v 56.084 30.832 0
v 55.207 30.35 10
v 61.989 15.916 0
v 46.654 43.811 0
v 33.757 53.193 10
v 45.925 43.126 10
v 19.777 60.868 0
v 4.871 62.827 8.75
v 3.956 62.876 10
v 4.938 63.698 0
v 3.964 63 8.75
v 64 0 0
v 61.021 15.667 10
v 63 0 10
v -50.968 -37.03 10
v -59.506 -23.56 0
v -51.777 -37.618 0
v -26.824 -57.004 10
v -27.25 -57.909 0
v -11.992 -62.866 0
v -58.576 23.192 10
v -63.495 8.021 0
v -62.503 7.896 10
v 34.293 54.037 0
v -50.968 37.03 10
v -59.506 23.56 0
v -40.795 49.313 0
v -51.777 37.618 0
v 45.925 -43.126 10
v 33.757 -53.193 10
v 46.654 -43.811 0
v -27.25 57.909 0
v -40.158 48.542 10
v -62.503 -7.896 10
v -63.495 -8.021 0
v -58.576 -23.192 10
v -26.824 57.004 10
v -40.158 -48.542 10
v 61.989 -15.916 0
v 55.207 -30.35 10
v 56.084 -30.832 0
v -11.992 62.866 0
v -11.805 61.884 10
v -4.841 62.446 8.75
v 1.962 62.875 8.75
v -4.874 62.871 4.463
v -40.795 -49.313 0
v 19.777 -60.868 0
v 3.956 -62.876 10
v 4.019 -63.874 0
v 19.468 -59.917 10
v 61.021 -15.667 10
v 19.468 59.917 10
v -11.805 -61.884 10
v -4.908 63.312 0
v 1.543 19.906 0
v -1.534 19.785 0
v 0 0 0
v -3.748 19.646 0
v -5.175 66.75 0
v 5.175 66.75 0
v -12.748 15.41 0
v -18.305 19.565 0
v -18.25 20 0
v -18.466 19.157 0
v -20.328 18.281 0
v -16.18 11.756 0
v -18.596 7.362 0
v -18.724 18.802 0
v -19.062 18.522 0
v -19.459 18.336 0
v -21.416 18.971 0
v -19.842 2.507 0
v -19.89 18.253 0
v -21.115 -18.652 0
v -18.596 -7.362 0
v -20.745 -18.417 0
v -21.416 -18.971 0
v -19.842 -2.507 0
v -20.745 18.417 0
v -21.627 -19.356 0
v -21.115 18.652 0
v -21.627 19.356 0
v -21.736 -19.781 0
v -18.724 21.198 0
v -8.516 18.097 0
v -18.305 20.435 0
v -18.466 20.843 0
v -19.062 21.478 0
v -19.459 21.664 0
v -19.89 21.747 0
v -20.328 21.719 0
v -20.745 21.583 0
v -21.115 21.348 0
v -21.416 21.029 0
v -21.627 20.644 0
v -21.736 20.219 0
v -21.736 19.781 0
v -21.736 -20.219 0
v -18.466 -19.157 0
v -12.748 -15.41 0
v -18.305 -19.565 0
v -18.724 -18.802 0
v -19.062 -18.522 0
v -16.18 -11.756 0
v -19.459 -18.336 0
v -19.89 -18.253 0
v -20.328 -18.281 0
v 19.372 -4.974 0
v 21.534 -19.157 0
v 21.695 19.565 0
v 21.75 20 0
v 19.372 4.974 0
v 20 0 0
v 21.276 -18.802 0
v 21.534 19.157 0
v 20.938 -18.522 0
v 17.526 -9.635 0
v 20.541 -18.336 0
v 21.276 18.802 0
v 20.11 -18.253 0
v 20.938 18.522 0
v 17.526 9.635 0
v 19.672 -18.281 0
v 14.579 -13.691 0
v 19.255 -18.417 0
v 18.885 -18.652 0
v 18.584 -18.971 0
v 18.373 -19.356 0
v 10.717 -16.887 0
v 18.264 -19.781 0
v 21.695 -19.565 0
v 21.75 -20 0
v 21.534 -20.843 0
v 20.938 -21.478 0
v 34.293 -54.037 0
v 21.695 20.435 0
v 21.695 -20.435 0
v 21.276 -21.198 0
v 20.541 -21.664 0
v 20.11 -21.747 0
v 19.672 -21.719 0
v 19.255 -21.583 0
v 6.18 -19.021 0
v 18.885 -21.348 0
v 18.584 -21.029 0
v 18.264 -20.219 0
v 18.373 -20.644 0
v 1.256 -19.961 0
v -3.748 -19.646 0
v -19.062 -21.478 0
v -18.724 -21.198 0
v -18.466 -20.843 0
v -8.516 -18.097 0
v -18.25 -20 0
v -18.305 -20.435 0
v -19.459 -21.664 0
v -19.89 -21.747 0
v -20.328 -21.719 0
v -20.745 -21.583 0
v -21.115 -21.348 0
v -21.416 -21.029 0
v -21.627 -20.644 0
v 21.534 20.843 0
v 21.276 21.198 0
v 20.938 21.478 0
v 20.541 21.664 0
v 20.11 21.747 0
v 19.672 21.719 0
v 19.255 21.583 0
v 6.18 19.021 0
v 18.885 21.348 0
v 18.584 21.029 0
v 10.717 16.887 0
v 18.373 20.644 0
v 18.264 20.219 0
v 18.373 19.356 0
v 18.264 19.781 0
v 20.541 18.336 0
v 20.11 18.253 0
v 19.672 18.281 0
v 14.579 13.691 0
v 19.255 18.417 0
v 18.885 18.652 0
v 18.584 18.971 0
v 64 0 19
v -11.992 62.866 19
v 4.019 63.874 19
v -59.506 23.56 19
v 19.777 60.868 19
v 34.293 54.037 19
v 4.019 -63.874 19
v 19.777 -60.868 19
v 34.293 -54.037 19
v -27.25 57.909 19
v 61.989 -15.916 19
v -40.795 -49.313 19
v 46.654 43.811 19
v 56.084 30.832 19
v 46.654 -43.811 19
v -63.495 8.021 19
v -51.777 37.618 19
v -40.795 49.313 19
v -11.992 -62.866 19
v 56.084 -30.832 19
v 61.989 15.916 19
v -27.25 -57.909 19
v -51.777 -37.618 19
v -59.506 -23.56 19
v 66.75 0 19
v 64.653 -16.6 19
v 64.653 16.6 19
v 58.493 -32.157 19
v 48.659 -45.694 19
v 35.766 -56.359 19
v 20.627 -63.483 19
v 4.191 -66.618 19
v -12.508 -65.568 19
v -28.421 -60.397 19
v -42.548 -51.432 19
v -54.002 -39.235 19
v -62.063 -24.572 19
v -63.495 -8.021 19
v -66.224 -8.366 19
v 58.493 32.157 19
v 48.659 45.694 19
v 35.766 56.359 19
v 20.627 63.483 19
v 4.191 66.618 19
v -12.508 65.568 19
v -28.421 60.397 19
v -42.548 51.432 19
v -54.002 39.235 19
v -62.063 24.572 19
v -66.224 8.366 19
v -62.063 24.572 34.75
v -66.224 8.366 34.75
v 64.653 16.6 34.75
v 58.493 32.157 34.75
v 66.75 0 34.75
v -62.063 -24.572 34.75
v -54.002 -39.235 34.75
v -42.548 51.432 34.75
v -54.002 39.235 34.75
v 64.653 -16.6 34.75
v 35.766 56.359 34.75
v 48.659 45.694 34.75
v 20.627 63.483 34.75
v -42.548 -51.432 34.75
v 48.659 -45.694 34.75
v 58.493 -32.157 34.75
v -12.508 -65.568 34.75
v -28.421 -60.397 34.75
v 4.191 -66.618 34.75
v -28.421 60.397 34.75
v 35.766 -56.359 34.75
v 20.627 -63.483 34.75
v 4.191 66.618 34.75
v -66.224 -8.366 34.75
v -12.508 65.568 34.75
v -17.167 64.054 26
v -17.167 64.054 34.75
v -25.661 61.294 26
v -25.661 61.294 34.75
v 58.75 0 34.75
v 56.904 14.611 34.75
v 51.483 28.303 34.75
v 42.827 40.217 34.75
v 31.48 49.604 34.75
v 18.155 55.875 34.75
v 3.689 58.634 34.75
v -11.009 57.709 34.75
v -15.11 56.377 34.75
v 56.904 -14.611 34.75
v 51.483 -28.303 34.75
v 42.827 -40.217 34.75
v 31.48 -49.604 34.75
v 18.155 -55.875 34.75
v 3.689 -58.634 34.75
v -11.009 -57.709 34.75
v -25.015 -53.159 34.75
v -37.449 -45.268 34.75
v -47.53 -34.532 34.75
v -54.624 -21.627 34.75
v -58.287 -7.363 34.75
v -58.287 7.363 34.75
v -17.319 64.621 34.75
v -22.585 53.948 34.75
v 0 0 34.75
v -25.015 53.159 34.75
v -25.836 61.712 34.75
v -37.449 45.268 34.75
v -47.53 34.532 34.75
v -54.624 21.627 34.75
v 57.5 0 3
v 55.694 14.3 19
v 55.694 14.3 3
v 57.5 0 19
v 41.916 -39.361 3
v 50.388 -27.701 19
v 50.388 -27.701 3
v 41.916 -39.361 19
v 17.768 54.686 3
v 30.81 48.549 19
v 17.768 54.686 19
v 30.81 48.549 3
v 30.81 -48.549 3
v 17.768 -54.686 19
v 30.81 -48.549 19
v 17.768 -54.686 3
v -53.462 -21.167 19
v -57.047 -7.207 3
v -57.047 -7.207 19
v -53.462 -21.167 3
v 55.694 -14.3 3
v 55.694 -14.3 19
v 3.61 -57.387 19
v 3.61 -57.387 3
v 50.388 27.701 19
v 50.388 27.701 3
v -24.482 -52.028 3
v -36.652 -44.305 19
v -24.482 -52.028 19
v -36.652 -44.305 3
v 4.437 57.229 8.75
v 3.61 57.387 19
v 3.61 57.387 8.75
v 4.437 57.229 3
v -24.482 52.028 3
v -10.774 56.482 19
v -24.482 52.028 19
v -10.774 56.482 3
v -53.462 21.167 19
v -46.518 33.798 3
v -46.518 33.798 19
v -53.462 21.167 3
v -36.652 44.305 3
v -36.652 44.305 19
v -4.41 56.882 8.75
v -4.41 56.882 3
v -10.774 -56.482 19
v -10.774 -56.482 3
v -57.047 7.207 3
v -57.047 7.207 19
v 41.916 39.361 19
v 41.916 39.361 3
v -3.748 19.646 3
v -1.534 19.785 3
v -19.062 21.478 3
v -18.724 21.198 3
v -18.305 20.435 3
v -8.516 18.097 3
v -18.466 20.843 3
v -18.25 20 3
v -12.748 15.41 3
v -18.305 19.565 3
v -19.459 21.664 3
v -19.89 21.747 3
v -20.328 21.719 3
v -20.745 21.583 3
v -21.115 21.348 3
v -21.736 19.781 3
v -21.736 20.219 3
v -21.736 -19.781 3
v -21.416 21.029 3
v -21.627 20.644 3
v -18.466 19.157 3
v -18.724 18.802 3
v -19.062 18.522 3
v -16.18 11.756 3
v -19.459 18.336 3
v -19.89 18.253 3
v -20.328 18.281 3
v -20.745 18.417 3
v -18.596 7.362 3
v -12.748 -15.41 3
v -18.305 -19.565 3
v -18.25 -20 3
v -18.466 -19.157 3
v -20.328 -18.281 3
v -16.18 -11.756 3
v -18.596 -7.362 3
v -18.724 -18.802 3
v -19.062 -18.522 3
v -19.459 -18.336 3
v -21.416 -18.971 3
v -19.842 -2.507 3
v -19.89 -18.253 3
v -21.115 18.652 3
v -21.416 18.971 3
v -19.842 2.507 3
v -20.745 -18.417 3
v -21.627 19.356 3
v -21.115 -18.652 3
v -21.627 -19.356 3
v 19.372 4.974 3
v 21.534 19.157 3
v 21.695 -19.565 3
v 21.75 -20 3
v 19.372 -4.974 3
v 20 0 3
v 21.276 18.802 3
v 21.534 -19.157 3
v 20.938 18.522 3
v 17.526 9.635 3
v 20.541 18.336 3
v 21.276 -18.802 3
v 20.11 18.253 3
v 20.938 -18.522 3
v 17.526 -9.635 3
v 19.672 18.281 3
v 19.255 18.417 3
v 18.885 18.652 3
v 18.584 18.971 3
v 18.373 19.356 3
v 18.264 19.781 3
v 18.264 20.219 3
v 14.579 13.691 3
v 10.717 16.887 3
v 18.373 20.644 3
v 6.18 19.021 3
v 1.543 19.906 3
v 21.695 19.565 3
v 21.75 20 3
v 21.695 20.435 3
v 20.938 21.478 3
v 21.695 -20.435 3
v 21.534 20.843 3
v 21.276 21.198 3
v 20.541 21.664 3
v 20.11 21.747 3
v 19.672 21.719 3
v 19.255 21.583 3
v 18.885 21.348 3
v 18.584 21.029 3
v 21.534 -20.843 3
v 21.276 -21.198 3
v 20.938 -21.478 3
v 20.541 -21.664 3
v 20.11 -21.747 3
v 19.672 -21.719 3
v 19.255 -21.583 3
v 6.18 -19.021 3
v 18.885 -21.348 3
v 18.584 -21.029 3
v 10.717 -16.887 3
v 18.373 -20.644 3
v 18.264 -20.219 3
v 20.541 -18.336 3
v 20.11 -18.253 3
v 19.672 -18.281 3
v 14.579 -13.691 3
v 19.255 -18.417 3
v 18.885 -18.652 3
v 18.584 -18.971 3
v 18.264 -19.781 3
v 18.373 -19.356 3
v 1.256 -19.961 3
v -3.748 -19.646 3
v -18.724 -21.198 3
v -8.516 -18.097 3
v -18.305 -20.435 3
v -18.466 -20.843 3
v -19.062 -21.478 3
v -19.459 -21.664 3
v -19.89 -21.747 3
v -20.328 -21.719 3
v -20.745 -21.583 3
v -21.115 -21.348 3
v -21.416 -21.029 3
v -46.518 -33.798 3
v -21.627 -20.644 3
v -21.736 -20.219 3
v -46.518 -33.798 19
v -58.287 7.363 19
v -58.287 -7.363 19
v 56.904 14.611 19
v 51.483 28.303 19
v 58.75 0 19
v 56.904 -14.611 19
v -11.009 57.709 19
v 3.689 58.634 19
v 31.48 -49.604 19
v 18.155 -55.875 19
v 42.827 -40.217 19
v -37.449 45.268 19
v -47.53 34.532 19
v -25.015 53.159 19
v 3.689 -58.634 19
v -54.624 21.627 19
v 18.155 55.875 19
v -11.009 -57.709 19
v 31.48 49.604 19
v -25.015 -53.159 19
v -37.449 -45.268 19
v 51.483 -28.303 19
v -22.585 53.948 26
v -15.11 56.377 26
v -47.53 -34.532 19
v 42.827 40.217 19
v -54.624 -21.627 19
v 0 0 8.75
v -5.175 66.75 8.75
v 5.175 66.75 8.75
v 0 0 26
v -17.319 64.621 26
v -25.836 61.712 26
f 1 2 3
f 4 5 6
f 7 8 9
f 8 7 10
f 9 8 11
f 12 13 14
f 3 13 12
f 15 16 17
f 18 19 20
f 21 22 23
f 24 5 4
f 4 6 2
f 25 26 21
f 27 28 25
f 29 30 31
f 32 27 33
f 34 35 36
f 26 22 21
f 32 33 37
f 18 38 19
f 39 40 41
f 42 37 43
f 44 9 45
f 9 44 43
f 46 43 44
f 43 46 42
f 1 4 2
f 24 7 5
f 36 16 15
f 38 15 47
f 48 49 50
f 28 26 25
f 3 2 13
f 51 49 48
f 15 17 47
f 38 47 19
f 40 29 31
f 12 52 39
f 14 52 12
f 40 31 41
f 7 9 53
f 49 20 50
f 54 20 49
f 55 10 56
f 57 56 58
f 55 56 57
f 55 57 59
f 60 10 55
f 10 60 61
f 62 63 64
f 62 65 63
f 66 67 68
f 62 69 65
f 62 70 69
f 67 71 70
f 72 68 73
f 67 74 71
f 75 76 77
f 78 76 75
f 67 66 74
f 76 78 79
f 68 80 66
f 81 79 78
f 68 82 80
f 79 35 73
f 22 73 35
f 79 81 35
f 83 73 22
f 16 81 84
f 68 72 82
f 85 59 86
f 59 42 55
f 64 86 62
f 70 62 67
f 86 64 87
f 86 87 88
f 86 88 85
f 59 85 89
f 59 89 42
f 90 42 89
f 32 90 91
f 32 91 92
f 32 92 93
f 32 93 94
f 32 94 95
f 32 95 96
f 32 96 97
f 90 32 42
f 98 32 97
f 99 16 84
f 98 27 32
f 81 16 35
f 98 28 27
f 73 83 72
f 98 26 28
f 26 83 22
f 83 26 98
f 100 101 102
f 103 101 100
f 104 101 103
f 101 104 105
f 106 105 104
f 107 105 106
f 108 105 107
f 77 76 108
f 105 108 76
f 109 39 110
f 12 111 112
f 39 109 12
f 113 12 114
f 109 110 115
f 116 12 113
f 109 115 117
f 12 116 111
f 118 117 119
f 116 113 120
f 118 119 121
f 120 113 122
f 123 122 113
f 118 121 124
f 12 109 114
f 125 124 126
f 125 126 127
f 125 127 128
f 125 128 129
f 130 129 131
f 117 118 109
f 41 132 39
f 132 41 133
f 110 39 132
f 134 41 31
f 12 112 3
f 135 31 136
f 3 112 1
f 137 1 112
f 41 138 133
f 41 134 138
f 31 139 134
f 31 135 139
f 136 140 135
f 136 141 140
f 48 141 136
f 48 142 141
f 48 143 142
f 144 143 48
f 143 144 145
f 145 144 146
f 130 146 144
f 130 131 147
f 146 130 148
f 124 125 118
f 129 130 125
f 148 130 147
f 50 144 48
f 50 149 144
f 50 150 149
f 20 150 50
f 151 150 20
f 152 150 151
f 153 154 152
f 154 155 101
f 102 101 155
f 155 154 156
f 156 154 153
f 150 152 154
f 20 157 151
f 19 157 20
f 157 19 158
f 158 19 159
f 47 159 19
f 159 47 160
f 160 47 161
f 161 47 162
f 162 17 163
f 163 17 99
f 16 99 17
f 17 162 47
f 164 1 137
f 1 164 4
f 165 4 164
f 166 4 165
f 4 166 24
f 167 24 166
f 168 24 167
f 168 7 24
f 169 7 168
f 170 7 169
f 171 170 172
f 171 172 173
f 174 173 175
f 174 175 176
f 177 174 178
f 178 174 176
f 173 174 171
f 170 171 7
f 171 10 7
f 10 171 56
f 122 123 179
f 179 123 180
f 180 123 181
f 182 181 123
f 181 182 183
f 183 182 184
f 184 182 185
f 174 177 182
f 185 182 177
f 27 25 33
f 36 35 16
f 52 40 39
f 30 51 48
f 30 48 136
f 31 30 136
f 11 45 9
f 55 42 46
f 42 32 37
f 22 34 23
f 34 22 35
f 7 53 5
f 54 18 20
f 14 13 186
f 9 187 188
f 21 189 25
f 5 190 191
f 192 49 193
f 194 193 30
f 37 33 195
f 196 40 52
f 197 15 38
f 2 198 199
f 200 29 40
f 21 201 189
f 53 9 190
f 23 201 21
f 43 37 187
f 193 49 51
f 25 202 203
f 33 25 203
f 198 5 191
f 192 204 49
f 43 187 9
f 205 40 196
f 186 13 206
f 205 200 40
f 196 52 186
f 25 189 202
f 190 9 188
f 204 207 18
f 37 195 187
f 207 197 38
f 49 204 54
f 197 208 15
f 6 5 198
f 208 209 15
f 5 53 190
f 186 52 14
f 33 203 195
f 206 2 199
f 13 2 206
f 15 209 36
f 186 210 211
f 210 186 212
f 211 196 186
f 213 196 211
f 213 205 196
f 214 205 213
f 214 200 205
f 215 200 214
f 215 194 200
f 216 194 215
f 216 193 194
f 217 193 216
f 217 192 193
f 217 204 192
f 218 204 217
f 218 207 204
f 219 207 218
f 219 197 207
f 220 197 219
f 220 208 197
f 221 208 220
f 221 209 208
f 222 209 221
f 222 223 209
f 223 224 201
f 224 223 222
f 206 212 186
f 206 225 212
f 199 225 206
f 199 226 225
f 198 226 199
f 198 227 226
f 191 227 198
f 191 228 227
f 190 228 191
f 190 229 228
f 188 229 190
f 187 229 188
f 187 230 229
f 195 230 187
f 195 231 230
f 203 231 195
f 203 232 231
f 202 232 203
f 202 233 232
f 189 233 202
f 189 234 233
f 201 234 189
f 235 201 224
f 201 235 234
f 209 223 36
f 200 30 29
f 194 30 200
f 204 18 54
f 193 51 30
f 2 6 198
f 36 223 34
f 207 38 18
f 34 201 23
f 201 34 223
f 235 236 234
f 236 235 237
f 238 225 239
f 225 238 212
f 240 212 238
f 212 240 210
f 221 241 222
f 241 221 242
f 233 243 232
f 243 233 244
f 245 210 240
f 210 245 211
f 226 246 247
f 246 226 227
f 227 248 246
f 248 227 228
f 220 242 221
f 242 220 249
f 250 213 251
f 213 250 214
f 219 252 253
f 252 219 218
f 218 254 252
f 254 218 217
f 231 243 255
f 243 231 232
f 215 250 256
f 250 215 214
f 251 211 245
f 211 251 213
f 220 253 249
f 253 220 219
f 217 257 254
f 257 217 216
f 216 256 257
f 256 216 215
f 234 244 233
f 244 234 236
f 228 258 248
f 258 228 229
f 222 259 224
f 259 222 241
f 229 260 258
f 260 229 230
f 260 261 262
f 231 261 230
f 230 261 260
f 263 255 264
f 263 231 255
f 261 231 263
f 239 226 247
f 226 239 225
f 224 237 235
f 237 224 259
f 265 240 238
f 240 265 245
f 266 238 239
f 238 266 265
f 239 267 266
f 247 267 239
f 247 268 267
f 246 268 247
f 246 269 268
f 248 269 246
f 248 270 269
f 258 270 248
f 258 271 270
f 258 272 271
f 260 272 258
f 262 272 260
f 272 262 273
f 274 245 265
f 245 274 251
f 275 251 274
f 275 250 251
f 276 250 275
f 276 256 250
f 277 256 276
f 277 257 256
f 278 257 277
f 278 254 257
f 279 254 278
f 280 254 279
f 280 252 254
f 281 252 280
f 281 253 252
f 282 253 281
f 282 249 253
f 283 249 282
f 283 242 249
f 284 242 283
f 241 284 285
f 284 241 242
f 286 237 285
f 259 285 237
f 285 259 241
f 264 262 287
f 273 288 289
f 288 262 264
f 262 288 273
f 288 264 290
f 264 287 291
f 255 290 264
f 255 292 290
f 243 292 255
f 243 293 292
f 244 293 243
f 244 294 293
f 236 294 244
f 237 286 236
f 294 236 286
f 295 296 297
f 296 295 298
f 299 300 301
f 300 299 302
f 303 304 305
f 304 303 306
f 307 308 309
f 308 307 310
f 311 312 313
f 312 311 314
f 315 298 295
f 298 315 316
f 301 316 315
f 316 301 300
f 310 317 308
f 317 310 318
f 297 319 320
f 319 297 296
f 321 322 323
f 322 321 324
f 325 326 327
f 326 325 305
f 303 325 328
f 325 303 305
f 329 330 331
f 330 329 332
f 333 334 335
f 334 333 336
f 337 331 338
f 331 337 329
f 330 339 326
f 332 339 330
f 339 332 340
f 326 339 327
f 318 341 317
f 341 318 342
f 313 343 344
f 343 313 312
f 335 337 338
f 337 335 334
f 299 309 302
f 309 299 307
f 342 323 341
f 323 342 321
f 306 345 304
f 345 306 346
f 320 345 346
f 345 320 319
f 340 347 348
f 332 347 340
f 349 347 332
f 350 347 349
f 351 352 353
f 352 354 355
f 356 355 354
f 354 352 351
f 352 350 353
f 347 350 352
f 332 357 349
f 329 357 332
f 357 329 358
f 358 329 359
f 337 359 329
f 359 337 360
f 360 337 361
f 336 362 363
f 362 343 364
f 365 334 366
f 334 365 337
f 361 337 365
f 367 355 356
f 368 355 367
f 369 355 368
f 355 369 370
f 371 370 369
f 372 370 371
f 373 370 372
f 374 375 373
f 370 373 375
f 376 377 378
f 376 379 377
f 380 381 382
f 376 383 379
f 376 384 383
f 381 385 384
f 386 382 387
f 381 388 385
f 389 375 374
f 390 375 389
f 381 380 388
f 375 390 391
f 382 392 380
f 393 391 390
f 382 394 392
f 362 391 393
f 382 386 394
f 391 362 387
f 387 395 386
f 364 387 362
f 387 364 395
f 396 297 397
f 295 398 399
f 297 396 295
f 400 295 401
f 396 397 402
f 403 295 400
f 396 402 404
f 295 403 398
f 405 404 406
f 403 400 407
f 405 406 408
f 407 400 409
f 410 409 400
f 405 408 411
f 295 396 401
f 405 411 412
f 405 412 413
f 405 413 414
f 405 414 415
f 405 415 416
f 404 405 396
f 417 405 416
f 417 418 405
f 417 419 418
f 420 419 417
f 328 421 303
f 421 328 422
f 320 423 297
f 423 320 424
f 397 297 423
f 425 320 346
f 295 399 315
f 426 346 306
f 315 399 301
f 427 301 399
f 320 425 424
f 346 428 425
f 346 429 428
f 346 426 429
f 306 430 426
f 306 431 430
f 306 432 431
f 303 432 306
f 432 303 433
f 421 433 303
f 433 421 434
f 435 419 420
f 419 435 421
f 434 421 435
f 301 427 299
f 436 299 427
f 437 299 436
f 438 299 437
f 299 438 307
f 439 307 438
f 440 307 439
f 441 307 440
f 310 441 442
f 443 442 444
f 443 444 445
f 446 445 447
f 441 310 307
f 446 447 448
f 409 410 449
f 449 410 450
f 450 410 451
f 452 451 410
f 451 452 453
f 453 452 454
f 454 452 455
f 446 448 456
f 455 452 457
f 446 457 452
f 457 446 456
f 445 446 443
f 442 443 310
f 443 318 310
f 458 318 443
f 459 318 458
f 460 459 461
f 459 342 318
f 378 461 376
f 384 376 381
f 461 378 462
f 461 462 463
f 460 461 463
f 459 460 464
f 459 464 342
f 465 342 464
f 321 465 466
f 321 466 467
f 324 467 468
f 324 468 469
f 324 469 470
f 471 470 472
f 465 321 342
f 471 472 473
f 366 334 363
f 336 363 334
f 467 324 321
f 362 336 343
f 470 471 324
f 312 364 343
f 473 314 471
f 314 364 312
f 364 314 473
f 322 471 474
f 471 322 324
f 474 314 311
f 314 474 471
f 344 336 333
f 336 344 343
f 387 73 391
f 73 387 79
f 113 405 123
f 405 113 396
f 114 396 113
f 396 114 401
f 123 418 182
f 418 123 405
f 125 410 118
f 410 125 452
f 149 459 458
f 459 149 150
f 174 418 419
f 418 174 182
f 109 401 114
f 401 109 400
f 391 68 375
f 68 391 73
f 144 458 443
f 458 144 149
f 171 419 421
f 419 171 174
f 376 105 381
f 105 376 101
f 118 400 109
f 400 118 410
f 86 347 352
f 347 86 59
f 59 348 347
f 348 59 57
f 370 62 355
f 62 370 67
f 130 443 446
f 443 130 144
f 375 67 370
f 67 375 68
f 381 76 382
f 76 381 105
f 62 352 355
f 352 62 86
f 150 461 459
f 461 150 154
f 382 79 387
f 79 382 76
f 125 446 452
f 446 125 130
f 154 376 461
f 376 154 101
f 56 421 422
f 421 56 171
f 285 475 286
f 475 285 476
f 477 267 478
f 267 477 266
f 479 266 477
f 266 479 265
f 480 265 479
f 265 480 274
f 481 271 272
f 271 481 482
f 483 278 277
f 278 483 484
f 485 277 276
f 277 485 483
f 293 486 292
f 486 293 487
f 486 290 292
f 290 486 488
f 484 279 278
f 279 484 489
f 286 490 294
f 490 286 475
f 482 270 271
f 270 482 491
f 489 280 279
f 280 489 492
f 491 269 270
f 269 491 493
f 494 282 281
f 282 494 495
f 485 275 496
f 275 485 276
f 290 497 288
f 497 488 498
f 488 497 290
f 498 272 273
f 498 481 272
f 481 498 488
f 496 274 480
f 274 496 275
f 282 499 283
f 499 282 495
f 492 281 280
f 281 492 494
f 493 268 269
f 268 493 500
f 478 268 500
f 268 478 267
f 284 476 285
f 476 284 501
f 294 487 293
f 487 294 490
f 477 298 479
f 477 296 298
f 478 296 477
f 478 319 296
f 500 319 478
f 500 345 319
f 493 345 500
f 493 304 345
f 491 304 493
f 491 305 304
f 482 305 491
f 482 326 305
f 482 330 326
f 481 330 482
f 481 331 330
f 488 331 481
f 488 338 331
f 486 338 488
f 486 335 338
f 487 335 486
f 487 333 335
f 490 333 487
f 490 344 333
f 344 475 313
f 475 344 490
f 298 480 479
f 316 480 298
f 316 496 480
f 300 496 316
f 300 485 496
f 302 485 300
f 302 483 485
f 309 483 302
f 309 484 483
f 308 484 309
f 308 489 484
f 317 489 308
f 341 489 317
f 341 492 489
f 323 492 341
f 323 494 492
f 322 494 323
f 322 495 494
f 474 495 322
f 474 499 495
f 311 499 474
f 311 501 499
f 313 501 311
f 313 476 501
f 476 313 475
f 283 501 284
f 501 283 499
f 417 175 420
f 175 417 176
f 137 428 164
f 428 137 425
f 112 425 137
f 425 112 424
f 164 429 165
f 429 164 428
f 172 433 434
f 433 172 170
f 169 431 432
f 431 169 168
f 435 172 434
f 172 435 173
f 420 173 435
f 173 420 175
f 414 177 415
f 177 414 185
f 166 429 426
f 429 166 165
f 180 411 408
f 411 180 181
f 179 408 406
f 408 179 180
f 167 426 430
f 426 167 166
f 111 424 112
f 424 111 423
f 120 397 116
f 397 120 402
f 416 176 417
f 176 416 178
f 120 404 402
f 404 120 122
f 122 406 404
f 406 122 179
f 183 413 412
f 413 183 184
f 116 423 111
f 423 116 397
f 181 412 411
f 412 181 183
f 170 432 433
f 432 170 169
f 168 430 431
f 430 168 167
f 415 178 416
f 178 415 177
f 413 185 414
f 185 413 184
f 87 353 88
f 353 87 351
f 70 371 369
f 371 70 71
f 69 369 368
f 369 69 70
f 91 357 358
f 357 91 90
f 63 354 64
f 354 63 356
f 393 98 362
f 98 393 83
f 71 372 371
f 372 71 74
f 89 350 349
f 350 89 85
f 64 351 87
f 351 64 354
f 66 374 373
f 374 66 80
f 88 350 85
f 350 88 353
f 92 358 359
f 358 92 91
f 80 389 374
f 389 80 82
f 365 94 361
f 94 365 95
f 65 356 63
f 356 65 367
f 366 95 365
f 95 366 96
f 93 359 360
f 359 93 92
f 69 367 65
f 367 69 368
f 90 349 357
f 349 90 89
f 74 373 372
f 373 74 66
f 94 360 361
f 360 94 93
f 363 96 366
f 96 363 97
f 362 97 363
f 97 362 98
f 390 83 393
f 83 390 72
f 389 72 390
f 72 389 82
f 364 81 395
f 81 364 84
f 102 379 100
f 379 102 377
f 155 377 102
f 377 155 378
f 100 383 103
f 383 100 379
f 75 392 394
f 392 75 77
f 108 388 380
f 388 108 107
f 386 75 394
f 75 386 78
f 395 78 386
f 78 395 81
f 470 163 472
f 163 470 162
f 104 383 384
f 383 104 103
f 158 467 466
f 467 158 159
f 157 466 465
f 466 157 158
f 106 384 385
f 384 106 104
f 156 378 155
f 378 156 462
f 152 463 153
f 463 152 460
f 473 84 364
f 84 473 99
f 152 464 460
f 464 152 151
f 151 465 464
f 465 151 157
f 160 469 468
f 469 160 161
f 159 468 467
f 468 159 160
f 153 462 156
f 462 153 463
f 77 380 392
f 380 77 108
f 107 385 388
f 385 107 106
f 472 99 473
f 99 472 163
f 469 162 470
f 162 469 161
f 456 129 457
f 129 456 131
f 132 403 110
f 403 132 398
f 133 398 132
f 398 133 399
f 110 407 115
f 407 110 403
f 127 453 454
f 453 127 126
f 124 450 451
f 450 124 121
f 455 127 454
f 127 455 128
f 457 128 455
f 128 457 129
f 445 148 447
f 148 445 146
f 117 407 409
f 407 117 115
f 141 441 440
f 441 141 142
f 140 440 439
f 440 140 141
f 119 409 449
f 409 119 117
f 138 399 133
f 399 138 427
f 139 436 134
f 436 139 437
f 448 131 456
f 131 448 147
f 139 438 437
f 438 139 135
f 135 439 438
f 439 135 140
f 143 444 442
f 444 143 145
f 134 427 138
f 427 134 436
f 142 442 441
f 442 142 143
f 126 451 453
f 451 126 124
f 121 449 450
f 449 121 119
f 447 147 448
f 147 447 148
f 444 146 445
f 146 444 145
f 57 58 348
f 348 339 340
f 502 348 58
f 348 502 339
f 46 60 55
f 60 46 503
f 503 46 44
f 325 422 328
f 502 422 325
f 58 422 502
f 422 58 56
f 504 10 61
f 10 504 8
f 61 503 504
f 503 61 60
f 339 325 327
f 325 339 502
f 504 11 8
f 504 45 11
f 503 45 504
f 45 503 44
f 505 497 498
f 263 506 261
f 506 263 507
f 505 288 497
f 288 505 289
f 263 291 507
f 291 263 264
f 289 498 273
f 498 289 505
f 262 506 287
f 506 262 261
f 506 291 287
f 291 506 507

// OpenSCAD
$fn=25;
sectionWidth=40;
outterWidth=133.5;

module outter()
{
	cylinder(d1=128,d2=126,h=10);
	translate([0,0,10]) cylinder(d1=126,d2=128,h=9);
	translate([0,0,19]) cylinder(d=outterWidth,h=15.75);
}

module middle()
{
	translate([0,0,3]) cylinder(d=115,h=17);
	cylinder(d=sectionWidth, h=3);
	translate([0,0,19]) cylinder(d=117.5,h=15.75);
}

module screwHoles()
{
	translate([20,20,0]) #cylinder(d=3.5,h=20);
	translate([-20,20,0]) #cylinder(d=3.5,h=20);
	translate([-20,-20,0]) #cylinder(d=3.5,h=20);
	translate([20,-20,0]) #cylinder(d=3.5,h=20);
}

module rod(width=10.35)
{
	sides = [
		[0,0,0], // 0
		[(width/2) * -1, (outterWidth / 2), 0], // 1
		[(width/2), (outterWidth/2),0], // 2
		[(width/2), (outterWidth/2),8.75], // 3
		[(width/2) * -1, (outterWidth/2),8.75], // 4
		[0,0,8.75] // 5
	];

	f = [
		[0,2,1],
		[5,4,3],
		[1,2,3,4],
		[1,4,5,0],
		[2,0,5,3],
	];
	polyhedron(points=sides, faces=f);
}

difference()
{
	outter();
	middle();
	screwHoles();
}
	rod();
	translate([0,0,26]) rotate([0,0,15 + 3.86]) rod(9);
//	translate([-4.5,0,26]) rotate([0,0,15]) cube([9,70,8.75]);
//	translate([-4.5,0,26]) rotate([0,0,-15]) cube([9,70,8.75]);
	for(i=[1:8])
	{
//		translate([-5.175,0,26]) rotate([0,0,15 + (13.46 * i)]) cube([10.35,70,8.75]);
	}
